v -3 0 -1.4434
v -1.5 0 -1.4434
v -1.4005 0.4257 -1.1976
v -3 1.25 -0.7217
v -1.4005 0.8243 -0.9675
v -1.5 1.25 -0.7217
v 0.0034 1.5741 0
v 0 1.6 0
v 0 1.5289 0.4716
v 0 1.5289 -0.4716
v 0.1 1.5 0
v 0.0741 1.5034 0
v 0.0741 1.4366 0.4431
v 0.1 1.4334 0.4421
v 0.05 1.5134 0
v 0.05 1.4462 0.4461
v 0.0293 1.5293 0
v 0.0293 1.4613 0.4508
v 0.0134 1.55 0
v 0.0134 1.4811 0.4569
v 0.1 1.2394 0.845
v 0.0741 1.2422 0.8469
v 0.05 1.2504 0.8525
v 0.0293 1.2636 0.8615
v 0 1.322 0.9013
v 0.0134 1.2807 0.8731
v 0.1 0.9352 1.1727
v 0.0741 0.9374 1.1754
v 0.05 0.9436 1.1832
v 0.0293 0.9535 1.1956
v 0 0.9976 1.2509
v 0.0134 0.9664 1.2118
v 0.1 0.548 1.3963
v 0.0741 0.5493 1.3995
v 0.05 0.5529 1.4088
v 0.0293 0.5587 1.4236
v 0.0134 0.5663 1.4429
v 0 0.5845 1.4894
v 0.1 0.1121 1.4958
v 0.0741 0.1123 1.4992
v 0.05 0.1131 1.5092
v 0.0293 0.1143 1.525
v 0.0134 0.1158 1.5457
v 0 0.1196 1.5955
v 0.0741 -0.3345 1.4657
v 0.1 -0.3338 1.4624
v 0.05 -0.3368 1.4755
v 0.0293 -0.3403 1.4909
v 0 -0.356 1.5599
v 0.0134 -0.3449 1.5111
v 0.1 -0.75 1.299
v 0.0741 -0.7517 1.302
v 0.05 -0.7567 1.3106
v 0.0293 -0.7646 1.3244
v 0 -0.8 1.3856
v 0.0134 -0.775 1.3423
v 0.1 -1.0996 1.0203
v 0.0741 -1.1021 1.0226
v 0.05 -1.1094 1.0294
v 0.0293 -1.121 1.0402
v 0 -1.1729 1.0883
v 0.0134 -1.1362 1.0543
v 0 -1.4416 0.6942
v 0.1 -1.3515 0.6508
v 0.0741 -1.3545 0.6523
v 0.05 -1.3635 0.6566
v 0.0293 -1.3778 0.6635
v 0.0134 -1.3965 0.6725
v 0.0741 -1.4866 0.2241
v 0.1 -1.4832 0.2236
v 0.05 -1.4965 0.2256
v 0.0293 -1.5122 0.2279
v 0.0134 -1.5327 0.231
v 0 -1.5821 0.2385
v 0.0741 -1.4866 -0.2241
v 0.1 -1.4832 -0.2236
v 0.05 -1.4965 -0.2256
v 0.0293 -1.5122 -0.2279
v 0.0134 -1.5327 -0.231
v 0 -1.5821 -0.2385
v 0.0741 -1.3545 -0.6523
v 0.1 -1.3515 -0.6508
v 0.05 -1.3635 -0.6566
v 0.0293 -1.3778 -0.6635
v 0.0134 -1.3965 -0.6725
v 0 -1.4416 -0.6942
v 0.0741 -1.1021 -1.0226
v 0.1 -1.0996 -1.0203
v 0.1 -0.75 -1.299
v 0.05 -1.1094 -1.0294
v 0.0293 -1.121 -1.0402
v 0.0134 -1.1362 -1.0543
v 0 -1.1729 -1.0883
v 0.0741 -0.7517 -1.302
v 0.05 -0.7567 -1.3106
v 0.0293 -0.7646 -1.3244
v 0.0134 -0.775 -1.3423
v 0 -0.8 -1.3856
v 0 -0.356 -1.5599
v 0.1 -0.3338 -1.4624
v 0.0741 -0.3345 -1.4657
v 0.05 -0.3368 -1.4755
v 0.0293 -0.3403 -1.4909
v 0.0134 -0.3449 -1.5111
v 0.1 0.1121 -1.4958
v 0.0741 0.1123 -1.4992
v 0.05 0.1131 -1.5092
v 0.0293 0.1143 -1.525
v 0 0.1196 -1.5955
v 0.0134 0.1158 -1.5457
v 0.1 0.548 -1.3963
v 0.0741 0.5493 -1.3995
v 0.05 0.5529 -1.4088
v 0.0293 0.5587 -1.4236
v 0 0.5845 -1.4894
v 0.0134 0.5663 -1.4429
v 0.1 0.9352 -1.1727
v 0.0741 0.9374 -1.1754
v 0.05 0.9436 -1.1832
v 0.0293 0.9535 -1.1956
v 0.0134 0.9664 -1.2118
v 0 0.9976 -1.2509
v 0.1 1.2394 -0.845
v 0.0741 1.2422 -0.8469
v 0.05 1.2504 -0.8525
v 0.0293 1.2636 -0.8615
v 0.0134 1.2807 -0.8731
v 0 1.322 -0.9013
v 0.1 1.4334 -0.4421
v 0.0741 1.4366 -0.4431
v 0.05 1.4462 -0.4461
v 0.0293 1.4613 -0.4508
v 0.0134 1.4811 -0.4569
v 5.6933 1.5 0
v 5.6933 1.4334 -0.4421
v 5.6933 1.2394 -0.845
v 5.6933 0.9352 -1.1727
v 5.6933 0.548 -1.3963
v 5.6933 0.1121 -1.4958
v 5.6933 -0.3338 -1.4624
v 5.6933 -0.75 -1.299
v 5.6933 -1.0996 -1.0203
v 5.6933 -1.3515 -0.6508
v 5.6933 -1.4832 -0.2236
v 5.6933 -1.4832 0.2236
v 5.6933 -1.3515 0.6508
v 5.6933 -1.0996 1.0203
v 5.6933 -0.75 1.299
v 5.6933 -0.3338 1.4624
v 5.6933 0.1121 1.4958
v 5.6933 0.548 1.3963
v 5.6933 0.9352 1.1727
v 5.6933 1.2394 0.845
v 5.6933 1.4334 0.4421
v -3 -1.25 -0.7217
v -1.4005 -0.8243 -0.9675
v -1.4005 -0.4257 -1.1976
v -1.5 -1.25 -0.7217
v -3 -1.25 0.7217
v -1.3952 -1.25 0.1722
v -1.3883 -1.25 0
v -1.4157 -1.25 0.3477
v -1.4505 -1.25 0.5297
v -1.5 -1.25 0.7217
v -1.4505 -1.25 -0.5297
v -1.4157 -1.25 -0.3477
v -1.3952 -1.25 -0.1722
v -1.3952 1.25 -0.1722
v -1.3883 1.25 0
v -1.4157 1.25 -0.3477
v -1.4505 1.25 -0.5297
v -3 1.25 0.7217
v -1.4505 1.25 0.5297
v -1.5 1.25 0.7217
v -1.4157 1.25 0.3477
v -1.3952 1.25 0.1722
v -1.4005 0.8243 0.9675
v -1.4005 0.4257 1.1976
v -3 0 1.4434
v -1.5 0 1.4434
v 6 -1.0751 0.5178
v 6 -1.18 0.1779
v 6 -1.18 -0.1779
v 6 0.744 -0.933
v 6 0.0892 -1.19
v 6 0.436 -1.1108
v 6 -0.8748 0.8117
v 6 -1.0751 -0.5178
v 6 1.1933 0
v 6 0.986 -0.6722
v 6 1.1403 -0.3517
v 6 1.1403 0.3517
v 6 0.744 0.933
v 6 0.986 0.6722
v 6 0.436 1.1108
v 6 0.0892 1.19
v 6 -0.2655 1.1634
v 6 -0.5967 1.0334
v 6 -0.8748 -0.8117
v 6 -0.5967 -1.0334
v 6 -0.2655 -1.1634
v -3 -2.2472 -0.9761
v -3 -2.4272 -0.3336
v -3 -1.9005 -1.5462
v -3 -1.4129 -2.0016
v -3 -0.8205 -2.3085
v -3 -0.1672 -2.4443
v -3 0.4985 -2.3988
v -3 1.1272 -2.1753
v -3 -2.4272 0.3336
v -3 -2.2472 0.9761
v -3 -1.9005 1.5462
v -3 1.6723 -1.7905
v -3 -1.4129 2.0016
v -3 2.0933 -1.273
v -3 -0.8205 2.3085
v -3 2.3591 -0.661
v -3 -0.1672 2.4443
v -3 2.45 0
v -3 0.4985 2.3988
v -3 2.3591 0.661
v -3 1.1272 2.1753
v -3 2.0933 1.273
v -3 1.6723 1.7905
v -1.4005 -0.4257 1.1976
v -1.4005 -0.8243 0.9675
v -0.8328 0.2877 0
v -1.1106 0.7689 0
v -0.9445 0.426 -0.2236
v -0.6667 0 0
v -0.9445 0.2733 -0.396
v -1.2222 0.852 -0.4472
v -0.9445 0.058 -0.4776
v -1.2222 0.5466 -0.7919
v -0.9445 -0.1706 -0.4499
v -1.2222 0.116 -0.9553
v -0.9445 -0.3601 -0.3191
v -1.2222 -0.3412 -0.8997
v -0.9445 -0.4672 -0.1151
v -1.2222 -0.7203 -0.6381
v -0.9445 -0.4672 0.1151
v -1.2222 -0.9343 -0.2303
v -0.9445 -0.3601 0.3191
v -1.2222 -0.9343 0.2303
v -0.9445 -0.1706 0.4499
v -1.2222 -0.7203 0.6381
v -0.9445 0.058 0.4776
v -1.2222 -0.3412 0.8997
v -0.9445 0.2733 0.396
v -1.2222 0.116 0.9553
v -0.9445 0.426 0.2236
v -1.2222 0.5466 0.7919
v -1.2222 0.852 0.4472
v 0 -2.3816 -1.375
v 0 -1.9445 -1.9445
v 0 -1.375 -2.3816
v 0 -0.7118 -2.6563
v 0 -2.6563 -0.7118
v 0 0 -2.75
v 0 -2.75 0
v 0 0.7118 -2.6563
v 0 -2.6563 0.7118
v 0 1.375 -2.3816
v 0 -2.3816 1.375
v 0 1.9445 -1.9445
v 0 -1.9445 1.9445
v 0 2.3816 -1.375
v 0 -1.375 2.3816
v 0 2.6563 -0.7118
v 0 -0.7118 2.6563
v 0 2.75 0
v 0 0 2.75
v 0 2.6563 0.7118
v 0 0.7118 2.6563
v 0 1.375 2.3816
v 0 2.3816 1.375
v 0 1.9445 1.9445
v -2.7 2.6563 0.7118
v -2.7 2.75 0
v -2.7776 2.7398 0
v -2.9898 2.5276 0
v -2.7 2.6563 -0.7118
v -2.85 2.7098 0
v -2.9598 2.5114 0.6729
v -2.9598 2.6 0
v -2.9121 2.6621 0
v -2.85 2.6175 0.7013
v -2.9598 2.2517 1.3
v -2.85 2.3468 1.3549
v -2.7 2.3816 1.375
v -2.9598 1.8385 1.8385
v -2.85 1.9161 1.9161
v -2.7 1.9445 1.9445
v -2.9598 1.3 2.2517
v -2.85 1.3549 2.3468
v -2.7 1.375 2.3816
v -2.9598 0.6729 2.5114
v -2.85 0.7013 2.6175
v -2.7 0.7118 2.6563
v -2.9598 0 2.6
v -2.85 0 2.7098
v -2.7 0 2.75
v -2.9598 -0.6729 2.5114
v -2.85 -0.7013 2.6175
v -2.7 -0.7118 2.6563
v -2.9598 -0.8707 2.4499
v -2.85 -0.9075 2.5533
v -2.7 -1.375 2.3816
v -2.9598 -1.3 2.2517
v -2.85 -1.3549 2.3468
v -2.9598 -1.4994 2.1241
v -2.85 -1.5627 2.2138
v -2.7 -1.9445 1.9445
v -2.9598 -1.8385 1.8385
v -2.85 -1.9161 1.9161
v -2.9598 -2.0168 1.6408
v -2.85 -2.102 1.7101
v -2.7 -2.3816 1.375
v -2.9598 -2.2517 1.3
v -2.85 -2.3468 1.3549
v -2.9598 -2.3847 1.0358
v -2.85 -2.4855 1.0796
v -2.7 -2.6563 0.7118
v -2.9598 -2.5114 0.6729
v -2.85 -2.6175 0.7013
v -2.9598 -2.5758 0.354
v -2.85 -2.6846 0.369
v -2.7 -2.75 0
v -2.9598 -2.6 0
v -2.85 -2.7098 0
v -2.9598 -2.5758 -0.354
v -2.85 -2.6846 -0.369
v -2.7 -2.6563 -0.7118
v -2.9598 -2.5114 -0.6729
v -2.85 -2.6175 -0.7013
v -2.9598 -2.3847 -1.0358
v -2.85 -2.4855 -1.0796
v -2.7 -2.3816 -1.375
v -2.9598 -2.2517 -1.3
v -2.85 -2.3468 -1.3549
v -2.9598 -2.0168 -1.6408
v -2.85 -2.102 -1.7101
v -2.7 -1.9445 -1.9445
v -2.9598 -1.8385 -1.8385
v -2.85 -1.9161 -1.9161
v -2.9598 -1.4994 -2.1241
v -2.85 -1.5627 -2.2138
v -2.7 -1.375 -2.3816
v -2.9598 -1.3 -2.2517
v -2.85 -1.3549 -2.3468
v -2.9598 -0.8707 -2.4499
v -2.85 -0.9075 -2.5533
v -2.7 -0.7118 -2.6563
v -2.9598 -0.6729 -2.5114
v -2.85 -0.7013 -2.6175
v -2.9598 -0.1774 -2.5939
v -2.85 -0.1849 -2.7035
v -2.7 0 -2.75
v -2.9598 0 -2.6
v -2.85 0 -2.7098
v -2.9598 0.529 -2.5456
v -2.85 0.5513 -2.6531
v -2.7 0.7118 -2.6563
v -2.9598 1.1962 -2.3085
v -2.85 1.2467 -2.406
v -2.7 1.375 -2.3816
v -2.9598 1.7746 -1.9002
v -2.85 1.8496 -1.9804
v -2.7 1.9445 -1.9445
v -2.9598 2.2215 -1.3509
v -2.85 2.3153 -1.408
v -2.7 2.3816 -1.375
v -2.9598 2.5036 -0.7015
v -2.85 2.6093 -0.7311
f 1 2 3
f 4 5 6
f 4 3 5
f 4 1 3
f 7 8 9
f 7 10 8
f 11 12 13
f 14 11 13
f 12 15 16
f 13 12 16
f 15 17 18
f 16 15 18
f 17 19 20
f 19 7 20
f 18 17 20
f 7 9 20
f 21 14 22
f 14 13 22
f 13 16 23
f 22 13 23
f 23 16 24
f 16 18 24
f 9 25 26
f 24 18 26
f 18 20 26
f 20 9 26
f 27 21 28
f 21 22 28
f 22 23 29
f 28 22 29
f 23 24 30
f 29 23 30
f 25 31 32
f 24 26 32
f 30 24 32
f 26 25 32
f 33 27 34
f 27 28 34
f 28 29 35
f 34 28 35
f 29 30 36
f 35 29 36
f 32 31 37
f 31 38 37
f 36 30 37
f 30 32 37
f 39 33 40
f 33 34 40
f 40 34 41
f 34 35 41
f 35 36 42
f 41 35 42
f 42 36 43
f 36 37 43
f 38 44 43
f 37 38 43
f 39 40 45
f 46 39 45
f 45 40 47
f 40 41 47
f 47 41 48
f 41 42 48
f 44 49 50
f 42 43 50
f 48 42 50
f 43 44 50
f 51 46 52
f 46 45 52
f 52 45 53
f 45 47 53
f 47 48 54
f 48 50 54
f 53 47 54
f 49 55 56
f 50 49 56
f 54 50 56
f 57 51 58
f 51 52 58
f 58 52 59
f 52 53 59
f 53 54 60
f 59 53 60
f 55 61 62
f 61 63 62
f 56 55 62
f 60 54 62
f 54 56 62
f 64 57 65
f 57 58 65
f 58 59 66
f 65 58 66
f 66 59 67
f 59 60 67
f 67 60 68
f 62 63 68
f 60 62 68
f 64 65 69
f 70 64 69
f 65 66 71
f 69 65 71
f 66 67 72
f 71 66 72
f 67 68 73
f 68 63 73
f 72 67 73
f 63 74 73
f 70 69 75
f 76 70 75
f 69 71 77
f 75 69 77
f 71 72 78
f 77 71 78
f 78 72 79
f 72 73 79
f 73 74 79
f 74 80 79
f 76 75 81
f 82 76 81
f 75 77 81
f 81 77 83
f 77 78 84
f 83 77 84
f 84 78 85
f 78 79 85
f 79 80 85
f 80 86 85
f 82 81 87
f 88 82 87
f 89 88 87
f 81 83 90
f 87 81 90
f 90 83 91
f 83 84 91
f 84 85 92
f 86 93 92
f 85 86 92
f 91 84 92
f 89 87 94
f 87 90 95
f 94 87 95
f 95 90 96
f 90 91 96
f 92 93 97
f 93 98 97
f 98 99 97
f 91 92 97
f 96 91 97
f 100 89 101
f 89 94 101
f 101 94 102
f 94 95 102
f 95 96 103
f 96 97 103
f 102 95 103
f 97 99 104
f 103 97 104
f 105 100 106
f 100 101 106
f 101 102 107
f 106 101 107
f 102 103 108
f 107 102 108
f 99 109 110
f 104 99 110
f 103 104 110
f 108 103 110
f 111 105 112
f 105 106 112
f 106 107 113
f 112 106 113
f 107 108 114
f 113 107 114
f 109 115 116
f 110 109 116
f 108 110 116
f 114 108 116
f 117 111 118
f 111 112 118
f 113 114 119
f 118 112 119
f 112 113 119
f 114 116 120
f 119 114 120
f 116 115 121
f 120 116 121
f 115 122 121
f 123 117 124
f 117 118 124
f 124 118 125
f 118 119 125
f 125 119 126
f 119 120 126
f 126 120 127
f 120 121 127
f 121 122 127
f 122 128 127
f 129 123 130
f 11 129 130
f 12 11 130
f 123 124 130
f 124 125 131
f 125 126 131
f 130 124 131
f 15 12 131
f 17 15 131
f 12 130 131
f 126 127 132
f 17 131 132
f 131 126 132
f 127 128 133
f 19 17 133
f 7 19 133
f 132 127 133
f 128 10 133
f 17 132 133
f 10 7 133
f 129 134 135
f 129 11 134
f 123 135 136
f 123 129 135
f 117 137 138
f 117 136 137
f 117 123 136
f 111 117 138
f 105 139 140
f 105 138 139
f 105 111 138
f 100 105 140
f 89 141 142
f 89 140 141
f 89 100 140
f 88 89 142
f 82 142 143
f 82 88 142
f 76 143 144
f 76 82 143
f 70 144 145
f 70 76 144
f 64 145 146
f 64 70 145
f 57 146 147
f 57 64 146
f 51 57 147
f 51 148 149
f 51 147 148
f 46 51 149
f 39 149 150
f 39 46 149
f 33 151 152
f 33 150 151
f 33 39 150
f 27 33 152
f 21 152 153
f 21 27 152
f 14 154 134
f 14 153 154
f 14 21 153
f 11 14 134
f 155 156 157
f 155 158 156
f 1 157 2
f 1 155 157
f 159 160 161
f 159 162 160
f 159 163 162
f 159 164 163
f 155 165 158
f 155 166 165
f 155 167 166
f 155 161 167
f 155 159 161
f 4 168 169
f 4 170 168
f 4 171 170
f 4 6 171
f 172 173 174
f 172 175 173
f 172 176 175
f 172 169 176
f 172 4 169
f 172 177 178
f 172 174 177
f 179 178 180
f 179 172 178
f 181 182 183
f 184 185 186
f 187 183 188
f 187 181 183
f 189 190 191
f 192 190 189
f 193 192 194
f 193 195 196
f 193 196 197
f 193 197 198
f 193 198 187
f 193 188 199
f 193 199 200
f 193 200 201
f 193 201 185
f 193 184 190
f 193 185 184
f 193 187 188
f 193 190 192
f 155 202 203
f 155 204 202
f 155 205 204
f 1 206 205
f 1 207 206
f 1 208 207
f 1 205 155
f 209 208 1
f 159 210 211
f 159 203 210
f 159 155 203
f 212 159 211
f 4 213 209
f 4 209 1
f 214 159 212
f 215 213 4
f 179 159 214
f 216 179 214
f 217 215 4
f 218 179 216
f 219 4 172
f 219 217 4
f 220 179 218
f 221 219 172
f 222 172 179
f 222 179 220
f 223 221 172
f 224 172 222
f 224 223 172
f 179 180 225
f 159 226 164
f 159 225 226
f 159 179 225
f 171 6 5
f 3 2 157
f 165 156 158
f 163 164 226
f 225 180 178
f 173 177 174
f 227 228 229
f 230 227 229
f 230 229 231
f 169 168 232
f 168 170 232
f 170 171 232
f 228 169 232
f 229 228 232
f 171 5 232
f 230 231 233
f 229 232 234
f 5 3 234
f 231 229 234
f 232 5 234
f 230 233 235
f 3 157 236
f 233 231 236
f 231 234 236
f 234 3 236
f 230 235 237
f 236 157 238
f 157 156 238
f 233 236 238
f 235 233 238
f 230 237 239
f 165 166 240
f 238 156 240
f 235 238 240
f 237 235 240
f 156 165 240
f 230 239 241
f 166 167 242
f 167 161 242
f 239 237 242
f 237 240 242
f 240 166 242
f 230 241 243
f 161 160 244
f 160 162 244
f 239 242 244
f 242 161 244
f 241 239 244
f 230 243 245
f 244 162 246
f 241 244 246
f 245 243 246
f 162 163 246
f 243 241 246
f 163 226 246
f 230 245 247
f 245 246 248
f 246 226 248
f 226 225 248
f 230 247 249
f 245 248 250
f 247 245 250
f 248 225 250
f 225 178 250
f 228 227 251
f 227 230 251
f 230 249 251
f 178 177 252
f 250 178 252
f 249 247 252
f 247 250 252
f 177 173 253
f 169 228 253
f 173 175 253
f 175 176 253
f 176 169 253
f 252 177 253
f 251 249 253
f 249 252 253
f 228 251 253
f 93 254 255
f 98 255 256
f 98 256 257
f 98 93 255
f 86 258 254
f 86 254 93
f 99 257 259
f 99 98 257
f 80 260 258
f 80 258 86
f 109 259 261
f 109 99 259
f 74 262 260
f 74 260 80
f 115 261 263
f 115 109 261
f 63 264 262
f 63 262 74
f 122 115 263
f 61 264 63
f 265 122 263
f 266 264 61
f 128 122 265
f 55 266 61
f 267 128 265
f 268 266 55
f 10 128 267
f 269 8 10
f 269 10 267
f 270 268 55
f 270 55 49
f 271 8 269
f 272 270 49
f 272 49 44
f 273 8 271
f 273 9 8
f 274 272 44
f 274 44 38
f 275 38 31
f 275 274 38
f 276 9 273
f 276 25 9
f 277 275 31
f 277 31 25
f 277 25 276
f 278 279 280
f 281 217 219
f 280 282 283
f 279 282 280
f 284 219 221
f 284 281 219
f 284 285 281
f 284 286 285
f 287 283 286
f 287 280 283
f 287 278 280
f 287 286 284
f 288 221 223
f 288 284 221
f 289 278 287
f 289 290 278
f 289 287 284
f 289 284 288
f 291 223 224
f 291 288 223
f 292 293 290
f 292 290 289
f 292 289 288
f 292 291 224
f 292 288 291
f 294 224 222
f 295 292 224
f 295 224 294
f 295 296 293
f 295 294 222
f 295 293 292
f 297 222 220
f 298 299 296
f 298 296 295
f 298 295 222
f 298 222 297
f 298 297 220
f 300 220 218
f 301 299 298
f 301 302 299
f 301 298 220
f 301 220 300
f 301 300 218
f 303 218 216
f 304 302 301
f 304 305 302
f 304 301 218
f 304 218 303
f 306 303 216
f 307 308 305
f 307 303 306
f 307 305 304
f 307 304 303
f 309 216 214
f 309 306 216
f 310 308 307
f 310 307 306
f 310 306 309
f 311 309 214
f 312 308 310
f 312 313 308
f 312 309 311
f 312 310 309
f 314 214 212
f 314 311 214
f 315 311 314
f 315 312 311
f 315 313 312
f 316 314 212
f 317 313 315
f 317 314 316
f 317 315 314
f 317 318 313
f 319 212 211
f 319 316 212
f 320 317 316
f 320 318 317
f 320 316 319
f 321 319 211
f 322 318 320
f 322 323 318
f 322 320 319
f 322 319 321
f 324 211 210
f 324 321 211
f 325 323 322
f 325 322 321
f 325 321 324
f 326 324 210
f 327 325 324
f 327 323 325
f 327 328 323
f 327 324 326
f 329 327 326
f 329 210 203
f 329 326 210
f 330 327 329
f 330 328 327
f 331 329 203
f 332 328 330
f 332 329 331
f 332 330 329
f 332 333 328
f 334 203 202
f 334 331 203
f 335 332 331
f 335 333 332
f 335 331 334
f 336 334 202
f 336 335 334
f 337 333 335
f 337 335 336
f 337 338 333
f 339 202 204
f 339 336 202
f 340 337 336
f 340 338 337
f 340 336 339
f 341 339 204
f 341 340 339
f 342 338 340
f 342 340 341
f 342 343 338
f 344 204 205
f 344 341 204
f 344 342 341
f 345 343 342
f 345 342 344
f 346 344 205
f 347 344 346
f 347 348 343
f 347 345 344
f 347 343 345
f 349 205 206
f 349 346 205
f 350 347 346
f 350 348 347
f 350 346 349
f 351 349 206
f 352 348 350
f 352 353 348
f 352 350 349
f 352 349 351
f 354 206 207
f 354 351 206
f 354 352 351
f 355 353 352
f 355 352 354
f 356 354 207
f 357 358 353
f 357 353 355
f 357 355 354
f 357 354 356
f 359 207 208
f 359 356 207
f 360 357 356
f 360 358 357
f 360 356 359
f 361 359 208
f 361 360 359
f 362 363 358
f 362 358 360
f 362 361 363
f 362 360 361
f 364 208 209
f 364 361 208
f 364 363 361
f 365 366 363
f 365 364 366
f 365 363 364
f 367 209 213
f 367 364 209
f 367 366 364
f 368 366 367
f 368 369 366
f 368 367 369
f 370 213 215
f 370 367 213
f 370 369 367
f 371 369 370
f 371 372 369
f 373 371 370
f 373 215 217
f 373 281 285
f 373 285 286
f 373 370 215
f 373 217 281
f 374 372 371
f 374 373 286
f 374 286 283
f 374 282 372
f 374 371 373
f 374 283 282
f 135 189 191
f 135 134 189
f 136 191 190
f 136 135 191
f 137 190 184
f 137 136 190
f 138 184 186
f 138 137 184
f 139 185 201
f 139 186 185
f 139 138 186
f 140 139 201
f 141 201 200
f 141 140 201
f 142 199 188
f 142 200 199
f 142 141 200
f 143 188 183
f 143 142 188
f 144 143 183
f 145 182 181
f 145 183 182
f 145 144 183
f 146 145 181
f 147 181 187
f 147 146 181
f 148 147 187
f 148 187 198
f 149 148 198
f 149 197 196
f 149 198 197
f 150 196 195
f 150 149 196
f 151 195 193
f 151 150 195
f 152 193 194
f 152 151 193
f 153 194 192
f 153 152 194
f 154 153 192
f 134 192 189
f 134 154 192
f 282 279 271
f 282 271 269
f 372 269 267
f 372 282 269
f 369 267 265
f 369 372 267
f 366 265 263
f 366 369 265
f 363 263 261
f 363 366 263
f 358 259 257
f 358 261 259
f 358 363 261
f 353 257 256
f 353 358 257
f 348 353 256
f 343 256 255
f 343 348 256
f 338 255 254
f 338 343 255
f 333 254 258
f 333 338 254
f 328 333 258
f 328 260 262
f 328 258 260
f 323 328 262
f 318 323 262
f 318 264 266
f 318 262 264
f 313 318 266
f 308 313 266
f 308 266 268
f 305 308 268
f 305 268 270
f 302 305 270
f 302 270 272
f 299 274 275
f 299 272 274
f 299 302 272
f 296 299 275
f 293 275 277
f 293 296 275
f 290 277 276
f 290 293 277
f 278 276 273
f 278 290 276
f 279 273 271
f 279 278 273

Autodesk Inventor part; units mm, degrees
ref_plane "YZ Plane" through (0, 0, 0) normal (1, 0, 0) x (0, 1, 0)
ref_plane "XZ Plane" through (0, 0, 0) normal (0, 1, 0) x (-1, 0, 0)
sketch "Esquisse1" plane through (0, 0, 0) normal (0, 0, 1) x (1, 0, 0)
  line L0 (-0.6667, 0) -> (6, 0)
  line L1 (6, 0) -> (6, 1.5)
  line L2 (6, 1.5) -> (1.3067, 1.5)
  line L3 (1.3067, 1.5) -> (1, 1.5)
  line L4 (1, 1.5) -> (0, 1.5)
  line L5 (0, 1.5) -> (0, 2.75)
  line L6 (0, 2.75) -> (-3, 2.75)
  line L7 (-3, 2.75) -> (-3, 1.4434)
  line L8 (-3, 1.4434) -> (-1.5, 1.4434)
  line L9 (-1.5, 1.4434) -> (-0.6667, 0)
  line L10 (-4.8, 0) -> (7.8, 0) projected
  line L11 (0, -0.55) -> (0, 3.3) projected
  line L12 (1.3067, 1.5) -> (0, 1.5) construction
  dimension "d0" = 4.6933
  dimension "d1" = 0.3067
  dimension "d2" = 3
  dimension "d3" = 1.5
  dimension "d4" = 60
  dimension "d5" = 3
  dimension "d6" = 3
  dimension "d7" = 2.8868
  dimension "d8" = 5.5
  dimension "d19" = 6
revolve "Corps" add sketch "Esquisse1" angle 360 about axis through (-0.6667, 0, 0) along (1, 0, 0)
sketch "Esquisse2" plane through (-3, 0, 0) normal (-1, 0, 0) x (0, 0, 1)
  circle A0 centre (0, 0) radius 1.4434 projected
  line L0 (0, -3.85) -> (0, 3.85) projected
  line L1 (-3.85, 0) -> (3.85, 0) projected
  line L2 (1.4434, 0) -> (0.7217, -1.25)
  line L3 (0.7217, -1.25) -> (-0.7217, -1.25)
  line L4 (-0.7217, -1.25) -> (-1.4434, 0)
  line L5 (-1.4434, 0) -> (-0.7217, 1.25)
  line L6 (-0.7217, 1.25) -> (0.7217, 1.25)
  line L7 (0.7217, 1.25) -> (1.4434, 0)
extrude "Rainure" add sketch "Esquisse2" against normal up to next contours L7 A0 | A0 L2 | L6 L0 A0 | A0 L0 L3 | L0 L6 A0 | A0 L3 L0 | L4 A0 | A0 L5
fillet "Congé2" radius 0.3 1 edges at (-3, -2.75, 0)
thread "Filetage" size "M3x0.5" class "6g" standard "ISO Metric profile" length 4.6933
chamfer "Chanfrein1" distance 0.3067 distance2 0.3067 1 edges at (6, -1.5, 0) measured on face at (6, -0.2617, -0.7882)
fillet "Congé1" radius 0.1 1 edges at (0, -1.5, 0)
ref_plane "Work Plane1" through (30, 0, 0) normal (0, -0.5, 0.866) x (1, 0, 0)
equation "\"d0\" = GEL"
equation "\"d1\" = GAL"
equation "\"d2\" = KOH"
equation "\"d3\" = INTI"
equation "\"d5\" = GD"
equation "\"d6\" = BDM"
equation "\"d7\" = 1.1547 * SW"
equation "\"d8\" = KOD"
equation "\"d19\" = NLG"
equation "\"d16\" = RR"
equation "\"d12\" = GEL"
equation "\"d14\" = -0.5 * SPD + 0.5 * GD"
equation "\"d15\" = GUL"
equation "\"d29\" = R"
equation "\"GD\" = NND"
equation "\"NLG\" = 6"
equation "\"GEL\" = 4.69327"
equation "\"KOD\" = 5.5"
equation "\"KOH\" = 3"
equation "\"INTI\" = 1.5"
equation "\"GAL\" = 0.61345 * PTC"
equation "\"GUL\" = 0.61345 * PTC"
equation "\"BDM\" = NND"
equation "\"SW\" = 2.5"
equation "\"RR\" = 0.3"
equation "\"SPD\" = 2.38655"
equation "\"d28\" = R"
equation "\"R\" = 0.1"
equation "\"TOA\" = 30deg"
equation "\"THREADDIA\" = 3"
equation "\"KOD1\" = KOD"
equation "\"PTC\" = 0.5"
equation "\"NND\" = 3"
equation "\"E0\" = 1.155 * SW"
equation "\"GD1\" = THREADDIA - 1.2269 * PTC"
properties part number "ANSI B18.3.1M - M3x0,5 x 6" material "Acier, doux"
